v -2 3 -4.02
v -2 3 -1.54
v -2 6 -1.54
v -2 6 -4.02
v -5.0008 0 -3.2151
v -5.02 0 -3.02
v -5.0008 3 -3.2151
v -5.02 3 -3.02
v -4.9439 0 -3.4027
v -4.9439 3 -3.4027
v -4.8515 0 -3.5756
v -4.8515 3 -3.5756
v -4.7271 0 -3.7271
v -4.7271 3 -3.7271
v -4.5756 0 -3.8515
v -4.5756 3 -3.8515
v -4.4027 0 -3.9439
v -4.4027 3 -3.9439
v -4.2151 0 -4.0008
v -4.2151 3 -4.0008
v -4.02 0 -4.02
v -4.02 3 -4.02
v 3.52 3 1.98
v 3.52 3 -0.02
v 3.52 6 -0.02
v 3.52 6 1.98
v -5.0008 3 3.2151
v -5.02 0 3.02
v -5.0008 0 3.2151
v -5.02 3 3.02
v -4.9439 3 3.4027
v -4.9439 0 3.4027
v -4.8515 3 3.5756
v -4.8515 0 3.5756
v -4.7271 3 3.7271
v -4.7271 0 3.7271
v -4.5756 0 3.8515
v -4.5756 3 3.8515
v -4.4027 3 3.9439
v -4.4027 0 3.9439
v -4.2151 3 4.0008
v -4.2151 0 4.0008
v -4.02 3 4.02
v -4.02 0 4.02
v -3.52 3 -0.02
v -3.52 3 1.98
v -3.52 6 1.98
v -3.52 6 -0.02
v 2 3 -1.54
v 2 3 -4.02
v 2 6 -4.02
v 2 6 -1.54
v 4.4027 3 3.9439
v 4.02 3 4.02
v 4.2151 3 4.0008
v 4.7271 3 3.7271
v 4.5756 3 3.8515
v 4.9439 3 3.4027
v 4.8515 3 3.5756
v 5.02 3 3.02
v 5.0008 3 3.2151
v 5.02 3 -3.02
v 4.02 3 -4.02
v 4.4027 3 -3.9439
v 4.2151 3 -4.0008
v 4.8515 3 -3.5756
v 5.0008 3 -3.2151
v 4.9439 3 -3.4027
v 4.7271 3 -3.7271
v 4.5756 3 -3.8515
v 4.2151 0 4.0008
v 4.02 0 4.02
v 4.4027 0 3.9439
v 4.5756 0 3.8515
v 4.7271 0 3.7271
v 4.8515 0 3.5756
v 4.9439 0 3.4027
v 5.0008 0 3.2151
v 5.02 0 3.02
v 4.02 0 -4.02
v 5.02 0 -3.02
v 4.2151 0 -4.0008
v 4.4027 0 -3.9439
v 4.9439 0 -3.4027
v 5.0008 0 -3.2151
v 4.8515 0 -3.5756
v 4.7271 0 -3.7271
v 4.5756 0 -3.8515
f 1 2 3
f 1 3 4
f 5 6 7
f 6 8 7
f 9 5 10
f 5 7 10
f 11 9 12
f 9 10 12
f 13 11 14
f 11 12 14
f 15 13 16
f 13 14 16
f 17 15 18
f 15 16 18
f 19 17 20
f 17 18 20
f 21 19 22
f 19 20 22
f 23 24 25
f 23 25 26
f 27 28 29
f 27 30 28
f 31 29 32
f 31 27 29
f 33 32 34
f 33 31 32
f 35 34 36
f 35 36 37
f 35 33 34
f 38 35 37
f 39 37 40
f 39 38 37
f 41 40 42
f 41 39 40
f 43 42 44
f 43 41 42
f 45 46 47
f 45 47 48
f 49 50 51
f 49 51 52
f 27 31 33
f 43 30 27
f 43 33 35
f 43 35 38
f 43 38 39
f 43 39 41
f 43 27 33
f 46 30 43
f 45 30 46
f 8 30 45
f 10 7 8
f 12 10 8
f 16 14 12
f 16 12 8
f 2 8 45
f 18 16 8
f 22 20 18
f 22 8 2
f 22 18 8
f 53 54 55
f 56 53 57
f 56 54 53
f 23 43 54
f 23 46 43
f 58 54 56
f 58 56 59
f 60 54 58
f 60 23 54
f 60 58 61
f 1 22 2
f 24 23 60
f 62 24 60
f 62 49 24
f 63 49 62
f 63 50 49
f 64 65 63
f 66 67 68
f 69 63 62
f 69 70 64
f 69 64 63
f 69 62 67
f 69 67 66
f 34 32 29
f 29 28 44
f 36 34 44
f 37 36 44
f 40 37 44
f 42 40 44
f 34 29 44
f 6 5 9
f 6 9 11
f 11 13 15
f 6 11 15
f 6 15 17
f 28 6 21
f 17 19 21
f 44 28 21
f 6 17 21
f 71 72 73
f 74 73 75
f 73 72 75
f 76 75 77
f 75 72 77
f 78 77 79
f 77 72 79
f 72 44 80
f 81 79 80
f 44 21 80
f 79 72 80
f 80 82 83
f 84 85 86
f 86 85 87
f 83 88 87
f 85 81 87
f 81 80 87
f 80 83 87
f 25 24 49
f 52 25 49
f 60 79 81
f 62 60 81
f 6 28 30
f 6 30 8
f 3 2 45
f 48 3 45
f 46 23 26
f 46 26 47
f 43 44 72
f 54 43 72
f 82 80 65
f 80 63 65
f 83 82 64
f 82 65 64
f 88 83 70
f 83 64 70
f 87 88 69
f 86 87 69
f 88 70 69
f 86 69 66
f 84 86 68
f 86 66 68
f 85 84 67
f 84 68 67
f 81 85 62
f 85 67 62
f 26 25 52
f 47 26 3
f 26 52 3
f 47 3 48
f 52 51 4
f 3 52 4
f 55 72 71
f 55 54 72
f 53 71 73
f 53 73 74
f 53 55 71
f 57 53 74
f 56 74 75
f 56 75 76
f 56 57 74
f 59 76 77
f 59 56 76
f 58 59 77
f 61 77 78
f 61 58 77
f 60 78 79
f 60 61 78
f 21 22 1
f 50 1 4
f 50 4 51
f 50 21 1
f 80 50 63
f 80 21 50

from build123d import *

# Parameters (mm, degrees)
SKETCH1_W           = 10.04
SKETCH1_H           = 8.04
BOSS_EXTRUDE1_DEPTH = 3
BOSS_EXTRUDE2_START = 3
BOSS_EXTRUDE2_DEPTH = 3
FILLET2_R           = 1


with BuildPart() as part:
    # Sketch1 → Boss-Extrude1 (new body)
    with BuildSketch(Plane(origin=(0, 0, 0), x_dir=(1, 0, 0), z_dir=(0, 1, 0))):
        Rectangle(SKETCH1_W, SKETCH1_H)
    extrude(amount=BOSS_EXTRUDE1_DEPTH)

    # Sketch1<3> → Boss-Extrude2 (add)
    with BuildSketch(Plane(origin=(0, 0, 0), x_dir=(1, 0, 0), z_dir=(0, 1, 0)).offset(BOSS_EXTRUDE2_START)):
        Polygon((-2, 0.02), (-2, 4.02), (2, 4.02), (2, 0.02), (3.52, 0.02), (3.52, -1.98), (-3.52, -1.98), (-3.52, 0.02), align=None)
        Polygon((-2, 0.02), (-2, 1.54), (-3.52, 0.02), align=None)
        Polygon((3.52, 0.02), (2, 1.54), (2, 0.02), align=None)
    extrude(amount=BOSS_EXTRUDE2_DEPTH)

    # Fillet2
    fillet2_edges = [part.edges().sort_by_distance(p)[0] for p in [
        (5.02, 1.5, -4.02),
        (-5.02, 1.5, -4.02),
        (-5.02, 1.5, 4.02),
        (5.02, 1.5, 4.02),
    ]]
    fillet(fillet2_edges, radius=FILLET2_R)


solid = part.part
